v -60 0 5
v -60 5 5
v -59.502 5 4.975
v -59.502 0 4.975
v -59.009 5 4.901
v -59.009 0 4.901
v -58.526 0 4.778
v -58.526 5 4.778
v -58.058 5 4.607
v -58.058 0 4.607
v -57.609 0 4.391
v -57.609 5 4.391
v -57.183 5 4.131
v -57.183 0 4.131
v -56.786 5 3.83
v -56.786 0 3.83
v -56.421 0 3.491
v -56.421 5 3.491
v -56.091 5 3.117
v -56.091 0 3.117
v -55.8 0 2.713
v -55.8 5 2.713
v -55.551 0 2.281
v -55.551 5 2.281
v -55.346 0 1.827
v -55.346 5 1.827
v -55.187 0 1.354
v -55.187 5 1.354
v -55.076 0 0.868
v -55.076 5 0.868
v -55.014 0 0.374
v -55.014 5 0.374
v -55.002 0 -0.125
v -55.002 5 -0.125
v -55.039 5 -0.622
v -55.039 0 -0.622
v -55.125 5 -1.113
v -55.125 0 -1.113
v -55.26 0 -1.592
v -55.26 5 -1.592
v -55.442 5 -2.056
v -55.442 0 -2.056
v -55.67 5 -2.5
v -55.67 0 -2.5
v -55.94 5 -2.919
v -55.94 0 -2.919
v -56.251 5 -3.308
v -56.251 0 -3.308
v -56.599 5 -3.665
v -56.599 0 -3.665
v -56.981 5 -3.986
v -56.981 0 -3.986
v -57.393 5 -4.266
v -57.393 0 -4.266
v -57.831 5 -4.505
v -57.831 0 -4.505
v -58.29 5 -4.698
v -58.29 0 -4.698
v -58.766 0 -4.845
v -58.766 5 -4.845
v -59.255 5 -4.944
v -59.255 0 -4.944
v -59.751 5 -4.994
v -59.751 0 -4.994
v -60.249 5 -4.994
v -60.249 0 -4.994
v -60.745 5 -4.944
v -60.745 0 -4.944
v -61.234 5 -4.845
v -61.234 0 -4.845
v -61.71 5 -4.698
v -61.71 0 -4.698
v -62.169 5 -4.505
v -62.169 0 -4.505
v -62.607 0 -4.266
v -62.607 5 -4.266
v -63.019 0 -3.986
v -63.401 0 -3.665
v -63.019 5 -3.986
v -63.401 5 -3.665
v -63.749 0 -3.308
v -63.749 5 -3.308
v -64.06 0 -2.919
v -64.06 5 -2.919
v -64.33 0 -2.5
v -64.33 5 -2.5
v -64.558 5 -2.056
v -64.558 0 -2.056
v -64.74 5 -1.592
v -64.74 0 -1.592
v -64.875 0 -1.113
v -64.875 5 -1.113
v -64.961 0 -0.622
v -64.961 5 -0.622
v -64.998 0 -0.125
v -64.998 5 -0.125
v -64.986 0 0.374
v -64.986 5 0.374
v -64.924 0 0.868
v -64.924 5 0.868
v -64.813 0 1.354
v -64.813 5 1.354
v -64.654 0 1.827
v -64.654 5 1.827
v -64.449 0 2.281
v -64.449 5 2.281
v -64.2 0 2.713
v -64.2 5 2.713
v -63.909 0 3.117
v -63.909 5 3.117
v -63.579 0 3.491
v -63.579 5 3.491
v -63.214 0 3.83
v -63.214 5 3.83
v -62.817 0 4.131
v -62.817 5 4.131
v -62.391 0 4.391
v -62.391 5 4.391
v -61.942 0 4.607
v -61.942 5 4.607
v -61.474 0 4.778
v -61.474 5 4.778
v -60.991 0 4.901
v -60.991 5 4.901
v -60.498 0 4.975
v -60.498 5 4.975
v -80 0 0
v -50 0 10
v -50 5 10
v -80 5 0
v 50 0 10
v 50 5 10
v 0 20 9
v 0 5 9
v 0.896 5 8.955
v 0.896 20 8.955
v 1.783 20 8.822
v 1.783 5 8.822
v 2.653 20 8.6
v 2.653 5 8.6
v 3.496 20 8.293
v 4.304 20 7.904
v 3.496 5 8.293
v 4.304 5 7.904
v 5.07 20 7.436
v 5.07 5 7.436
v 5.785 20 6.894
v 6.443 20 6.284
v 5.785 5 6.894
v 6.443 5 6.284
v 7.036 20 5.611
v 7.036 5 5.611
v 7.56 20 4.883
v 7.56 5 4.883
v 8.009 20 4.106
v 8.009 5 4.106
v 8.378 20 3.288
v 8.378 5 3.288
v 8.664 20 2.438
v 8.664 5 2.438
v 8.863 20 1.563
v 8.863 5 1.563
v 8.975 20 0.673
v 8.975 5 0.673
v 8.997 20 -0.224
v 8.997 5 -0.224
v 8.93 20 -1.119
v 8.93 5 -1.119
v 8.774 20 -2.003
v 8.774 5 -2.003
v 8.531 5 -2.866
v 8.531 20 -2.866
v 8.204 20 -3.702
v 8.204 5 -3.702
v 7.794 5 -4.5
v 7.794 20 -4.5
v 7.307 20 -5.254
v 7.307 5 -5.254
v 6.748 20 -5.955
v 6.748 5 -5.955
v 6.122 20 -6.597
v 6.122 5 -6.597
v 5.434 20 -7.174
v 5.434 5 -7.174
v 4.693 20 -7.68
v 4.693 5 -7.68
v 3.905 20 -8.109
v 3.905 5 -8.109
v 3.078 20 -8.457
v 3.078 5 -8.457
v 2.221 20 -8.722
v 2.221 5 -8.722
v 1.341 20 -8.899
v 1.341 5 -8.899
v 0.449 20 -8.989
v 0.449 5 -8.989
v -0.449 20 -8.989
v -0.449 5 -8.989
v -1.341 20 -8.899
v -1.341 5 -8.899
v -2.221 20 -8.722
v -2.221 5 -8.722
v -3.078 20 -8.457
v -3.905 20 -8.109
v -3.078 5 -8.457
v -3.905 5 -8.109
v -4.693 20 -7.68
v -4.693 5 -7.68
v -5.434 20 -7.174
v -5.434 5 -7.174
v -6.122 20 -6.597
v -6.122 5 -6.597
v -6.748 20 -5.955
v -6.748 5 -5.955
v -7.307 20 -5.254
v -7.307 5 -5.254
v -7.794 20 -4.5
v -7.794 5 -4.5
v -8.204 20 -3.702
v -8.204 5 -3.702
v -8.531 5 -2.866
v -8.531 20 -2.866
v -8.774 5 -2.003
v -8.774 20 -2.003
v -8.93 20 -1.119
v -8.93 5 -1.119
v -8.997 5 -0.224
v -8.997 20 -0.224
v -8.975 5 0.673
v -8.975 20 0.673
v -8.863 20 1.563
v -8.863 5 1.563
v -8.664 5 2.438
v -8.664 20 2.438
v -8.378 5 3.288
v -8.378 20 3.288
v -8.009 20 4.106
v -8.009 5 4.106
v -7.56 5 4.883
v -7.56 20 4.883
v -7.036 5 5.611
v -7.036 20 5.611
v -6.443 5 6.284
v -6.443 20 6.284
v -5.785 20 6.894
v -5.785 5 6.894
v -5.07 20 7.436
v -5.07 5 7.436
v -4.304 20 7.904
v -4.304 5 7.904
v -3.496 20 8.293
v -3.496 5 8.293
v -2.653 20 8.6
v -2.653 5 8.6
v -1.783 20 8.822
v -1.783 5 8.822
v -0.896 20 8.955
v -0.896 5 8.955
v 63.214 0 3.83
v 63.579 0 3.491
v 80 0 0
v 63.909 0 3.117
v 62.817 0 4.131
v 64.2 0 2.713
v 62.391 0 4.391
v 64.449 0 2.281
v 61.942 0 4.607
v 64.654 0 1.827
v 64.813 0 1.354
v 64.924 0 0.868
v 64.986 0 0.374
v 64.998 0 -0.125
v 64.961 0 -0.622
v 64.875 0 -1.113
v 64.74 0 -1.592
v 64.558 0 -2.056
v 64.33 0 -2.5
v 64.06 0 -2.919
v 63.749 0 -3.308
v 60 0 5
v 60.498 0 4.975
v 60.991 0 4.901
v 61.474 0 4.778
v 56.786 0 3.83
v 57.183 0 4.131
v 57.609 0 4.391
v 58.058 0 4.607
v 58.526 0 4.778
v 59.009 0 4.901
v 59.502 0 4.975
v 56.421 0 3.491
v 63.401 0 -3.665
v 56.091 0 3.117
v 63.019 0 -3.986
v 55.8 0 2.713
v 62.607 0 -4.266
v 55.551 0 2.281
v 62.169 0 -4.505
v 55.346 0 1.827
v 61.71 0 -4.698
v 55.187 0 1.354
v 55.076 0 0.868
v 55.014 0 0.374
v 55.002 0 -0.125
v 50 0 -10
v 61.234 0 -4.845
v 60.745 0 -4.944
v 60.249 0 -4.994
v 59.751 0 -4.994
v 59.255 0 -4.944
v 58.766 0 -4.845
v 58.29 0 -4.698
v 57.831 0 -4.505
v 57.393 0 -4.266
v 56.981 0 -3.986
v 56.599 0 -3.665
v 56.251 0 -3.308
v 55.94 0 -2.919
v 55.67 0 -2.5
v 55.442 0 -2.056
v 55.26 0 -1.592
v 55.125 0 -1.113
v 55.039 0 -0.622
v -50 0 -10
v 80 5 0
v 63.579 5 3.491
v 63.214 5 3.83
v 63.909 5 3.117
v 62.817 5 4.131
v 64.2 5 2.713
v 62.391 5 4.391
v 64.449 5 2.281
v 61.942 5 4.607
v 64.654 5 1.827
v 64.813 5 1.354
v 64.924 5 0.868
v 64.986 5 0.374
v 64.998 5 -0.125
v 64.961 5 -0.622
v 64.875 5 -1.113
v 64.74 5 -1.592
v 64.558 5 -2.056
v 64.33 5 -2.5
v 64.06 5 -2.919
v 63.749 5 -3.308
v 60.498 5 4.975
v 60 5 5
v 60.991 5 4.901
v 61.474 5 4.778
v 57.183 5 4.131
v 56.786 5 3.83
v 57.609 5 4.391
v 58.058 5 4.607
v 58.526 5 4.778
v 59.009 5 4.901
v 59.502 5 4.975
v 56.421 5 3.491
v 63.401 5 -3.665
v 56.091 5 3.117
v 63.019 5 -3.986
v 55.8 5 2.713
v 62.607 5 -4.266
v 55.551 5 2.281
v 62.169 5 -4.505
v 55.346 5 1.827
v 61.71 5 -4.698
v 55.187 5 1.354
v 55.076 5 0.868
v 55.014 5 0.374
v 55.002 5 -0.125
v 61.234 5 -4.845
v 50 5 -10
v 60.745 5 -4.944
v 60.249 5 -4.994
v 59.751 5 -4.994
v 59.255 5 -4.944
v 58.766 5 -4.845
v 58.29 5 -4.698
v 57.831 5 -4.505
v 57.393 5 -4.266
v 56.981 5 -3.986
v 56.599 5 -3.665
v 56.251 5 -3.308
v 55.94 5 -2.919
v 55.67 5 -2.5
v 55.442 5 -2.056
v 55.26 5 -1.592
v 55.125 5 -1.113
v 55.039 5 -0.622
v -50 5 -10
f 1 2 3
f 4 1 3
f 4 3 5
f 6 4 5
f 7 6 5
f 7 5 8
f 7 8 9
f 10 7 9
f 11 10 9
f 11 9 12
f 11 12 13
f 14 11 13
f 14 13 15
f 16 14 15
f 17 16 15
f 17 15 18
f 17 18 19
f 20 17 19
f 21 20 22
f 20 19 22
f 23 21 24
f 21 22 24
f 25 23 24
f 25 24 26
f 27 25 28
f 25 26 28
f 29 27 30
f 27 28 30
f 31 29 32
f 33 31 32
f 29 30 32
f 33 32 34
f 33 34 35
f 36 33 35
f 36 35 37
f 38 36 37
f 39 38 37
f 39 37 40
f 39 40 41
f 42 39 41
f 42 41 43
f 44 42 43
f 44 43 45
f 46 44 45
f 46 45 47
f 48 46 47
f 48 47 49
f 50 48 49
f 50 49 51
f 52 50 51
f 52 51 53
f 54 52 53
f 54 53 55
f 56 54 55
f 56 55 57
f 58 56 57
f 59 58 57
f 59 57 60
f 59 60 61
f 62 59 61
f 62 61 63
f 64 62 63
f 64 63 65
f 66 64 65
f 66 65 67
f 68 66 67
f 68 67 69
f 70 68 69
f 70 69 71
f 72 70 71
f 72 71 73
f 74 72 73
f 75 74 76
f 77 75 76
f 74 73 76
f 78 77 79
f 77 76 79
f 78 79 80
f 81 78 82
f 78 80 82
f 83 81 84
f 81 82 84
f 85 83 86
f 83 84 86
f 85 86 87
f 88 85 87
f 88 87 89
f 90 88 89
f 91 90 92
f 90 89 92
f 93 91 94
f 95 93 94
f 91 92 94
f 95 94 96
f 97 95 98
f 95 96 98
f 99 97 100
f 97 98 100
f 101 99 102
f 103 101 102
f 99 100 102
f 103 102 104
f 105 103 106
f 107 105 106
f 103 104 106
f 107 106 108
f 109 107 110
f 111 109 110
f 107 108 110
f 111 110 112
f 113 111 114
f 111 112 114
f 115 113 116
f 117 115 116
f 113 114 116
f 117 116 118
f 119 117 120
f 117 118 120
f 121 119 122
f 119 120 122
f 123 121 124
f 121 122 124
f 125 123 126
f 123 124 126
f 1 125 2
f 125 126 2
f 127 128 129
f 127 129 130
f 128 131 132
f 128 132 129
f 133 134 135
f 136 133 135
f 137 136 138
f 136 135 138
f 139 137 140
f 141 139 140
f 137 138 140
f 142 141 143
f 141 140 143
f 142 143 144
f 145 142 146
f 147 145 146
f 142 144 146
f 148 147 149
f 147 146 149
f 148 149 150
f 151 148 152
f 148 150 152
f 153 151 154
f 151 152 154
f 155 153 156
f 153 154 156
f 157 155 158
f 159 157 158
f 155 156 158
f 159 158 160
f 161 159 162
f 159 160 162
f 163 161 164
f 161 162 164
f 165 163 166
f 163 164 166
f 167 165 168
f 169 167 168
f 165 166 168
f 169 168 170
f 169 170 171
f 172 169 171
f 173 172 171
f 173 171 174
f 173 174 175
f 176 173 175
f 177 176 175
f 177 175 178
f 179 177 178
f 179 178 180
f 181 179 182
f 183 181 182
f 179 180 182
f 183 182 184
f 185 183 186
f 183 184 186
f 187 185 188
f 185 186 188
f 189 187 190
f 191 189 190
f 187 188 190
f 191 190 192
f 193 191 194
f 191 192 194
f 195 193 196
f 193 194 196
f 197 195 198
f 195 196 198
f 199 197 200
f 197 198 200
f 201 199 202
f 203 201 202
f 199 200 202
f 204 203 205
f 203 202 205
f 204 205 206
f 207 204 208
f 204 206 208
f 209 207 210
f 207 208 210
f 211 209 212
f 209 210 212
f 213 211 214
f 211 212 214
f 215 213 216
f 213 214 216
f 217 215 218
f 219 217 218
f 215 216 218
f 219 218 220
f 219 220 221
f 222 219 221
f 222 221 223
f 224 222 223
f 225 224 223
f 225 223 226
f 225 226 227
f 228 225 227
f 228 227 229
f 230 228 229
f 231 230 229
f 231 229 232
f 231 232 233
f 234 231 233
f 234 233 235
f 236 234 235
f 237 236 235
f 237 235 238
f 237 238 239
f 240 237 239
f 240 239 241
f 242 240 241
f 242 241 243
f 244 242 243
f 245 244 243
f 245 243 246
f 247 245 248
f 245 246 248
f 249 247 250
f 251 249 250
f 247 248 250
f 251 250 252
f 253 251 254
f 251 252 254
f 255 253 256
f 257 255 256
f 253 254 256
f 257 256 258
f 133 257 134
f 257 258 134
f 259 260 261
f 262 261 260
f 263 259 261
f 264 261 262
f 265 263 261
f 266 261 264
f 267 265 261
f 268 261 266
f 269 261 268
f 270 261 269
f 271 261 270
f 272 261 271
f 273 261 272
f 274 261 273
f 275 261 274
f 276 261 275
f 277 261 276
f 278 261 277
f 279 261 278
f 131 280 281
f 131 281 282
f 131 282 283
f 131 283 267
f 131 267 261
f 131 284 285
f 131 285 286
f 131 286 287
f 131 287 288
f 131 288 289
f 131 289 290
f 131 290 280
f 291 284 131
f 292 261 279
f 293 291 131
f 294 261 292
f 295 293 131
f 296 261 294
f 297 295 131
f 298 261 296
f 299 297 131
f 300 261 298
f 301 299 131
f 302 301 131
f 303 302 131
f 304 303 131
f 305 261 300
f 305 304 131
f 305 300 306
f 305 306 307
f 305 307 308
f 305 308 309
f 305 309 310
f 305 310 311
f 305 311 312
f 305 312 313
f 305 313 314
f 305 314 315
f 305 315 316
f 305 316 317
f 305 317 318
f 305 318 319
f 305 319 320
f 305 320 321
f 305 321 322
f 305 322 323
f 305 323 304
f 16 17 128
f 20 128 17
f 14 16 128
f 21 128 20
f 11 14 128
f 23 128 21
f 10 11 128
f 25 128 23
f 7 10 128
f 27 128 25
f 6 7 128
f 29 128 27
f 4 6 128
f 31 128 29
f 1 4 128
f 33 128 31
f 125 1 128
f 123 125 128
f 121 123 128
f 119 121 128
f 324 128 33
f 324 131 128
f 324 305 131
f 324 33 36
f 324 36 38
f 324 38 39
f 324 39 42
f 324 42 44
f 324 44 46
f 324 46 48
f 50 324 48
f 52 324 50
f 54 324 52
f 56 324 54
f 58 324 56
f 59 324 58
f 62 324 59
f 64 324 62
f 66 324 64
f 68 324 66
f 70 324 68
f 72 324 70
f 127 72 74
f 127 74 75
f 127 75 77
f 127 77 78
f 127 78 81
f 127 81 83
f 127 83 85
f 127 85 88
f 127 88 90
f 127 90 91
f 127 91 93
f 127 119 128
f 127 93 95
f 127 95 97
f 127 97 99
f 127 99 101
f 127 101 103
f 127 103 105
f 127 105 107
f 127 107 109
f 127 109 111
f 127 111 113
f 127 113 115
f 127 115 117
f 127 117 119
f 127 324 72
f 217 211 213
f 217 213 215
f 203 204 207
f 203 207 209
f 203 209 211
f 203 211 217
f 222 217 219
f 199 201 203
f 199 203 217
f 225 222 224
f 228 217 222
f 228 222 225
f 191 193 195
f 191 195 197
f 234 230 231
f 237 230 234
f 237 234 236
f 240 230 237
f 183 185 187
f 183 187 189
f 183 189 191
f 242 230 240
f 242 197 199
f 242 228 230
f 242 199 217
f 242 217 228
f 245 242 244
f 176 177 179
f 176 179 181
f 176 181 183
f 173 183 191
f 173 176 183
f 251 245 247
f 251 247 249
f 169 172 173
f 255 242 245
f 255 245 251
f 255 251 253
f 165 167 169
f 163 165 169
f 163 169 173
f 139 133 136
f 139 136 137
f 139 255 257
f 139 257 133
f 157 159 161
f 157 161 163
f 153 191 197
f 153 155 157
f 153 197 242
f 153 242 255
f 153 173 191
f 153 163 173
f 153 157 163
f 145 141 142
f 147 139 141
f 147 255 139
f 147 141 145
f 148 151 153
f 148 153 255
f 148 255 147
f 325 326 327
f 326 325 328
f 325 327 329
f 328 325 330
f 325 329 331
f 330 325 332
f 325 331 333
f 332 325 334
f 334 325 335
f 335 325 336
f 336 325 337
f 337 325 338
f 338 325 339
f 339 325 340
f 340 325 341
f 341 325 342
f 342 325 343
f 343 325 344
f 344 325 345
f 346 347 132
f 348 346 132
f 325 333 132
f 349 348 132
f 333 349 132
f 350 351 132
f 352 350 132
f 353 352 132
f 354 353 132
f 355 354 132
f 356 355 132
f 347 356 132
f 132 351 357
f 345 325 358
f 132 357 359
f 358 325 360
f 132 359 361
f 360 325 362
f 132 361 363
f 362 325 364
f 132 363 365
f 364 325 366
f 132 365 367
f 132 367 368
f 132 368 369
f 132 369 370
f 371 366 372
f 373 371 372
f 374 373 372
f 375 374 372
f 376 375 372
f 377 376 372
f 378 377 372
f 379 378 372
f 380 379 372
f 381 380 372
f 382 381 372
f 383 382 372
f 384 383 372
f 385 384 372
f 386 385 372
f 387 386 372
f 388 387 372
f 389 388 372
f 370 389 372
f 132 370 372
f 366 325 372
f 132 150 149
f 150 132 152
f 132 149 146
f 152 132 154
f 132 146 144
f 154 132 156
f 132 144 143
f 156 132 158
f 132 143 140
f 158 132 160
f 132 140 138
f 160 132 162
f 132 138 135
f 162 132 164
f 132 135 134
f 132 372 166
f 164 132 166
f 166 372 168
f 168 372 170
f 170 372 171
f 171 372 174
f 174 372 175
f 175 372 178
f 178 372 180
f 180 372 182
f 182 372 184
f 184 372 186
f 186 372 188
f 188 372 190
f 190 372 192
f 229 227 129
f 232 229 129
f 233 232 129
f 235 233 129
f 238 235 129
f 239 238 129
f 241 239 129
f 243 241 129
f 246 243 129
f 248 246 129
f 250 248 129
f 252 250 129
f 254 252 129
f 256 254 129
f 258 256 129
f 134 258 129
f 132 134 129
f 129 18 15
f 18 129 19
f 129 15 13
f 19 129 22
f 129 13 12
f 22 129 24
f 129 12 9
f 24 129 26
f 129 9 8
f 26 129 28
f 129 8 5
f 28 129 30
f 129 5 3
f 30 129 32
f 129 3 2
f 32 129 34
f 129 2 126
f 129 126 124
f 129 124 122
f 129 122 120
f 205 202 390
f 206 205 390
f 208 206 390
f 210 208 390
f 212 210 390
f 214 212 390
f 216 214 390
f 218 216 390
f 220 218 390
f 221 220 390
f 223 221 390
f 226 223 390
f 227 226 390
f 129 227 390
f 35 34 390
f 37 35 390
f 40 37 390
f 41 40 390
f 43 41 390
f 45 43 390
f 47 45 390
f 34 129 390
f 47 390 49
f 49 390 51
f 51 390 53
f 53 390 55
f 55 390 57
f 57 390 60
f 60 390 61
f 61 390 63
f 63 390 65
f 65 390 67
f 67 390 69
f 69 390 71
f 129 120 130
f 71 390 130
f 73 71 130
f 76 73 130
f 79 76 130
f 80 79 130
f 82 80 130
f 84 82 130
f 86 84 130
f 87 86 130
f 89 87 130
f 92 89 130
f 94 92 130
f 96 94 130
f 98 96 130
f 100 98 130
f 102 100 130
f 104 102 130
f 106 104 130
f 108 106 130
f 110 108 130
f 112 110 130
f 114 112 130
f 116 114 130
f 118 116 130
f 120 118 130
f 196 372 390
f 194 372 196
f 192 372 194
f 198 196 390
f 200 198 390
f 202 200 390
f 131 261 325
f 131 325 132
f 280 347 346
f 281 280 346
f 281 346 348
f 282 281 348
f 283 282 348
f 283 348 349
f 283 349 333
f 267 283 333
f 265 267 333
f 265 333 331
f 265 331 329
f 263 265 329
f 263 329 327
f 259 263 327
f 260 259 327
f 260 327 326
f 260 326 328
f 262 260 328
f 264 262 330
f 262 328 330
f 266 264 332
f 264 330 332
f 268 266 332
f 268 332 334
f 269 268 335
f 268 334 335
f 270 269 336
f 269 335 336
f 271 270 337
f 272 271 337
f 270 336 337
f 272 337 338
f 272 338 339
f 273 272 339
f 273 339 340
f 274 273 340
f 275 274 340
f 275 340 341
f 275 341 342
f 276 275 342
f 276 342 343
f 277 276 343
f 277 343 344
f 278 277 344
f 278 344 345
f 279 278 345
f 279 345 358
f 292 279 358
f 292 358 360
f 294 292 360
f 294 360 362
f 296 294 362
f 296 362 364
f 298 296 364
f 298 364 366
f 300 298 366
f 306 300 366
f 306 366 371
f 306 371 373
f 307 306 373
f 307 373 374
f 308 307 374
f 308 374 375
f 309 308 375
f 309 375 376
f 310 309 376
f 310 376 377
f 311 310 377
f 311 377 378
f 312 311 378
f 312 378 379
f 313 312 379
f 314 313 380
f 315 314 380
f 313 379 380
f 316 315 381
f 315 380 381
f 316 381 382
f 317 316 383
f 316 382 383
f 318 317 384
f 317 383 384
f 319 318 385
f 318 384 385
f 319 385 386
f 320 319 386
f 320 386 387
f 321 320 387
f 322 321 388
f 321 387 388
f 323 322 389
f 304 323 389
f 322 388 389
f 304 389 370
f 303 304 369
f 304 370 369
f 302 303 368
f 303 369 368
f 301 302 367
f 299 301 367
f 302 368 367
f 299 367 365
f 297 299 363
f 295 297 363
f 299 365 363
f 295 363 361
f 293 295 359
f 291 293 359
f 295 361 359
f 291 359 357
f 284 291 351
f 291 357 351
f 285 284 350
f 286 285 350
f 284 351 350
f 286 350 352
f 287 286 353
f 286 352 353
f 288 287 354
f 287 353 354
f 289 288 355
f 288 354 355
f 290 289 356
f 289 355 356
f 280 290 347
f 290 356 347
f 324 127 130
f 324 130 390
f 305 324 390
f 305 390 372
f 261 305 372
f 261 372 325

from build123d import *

# Parameters (mm, degrees)
BOSS_EXTRUDE1_DEPTH = 5
SKETCH3_R           = 9
BOSS_EXTRUDE2_DEPTH = 15
SKETCH5_R           = 5
CUT_EXTRUDE1_DEPTH  = 15


with BuildPart() as part:
    # Sketch1 → Boss-Extrude1 (new body)
    with BuildSketch(Plane(origin=(0, 0, 0), x_dir=(1, 0, 0), z_dir=(0, 1, 0))):
        Polygon((-50, 10), (50, 10), (80, 0), (50, -10), (-50, -10), (-80, 0), align=None)
    extrude(amount=BOSS_EXTRUDE1_DEPTH)

    # Sketch3 → Boss-Extrude2 (add)
    with BuildSketch(Plane(origin=(0, 5, 0), x_dir=(1, 0, 0), z_dir=(0, 1, 0))):
        with Locations(Location((0, 0, 0), (0, 0, 270))):
            Circle(SKETCH3_R)
    extrude(amount=BOSS_EXTRUDE2_DEPTH)

    # Sketch5 → Cut-Extrude1 (cut)
    with BuildSketch(Plane(origin=(0, 5, 0), x_dir=(1, 0, 0), z_dir=(0, 1, 0))):
        with Locations(Location((60, 0, 0), (0, 0, 270))):
            Circle(SKETCH5_R)
        with Locations(Location((-60, 0, 0), (0, 0, 270))):
            Circle(SKETCH5_R)
    extrude(amount=-CUT_EXTRUDE1_DEPTH, mode=Mode.SUBTRACT)


solid = part.part
